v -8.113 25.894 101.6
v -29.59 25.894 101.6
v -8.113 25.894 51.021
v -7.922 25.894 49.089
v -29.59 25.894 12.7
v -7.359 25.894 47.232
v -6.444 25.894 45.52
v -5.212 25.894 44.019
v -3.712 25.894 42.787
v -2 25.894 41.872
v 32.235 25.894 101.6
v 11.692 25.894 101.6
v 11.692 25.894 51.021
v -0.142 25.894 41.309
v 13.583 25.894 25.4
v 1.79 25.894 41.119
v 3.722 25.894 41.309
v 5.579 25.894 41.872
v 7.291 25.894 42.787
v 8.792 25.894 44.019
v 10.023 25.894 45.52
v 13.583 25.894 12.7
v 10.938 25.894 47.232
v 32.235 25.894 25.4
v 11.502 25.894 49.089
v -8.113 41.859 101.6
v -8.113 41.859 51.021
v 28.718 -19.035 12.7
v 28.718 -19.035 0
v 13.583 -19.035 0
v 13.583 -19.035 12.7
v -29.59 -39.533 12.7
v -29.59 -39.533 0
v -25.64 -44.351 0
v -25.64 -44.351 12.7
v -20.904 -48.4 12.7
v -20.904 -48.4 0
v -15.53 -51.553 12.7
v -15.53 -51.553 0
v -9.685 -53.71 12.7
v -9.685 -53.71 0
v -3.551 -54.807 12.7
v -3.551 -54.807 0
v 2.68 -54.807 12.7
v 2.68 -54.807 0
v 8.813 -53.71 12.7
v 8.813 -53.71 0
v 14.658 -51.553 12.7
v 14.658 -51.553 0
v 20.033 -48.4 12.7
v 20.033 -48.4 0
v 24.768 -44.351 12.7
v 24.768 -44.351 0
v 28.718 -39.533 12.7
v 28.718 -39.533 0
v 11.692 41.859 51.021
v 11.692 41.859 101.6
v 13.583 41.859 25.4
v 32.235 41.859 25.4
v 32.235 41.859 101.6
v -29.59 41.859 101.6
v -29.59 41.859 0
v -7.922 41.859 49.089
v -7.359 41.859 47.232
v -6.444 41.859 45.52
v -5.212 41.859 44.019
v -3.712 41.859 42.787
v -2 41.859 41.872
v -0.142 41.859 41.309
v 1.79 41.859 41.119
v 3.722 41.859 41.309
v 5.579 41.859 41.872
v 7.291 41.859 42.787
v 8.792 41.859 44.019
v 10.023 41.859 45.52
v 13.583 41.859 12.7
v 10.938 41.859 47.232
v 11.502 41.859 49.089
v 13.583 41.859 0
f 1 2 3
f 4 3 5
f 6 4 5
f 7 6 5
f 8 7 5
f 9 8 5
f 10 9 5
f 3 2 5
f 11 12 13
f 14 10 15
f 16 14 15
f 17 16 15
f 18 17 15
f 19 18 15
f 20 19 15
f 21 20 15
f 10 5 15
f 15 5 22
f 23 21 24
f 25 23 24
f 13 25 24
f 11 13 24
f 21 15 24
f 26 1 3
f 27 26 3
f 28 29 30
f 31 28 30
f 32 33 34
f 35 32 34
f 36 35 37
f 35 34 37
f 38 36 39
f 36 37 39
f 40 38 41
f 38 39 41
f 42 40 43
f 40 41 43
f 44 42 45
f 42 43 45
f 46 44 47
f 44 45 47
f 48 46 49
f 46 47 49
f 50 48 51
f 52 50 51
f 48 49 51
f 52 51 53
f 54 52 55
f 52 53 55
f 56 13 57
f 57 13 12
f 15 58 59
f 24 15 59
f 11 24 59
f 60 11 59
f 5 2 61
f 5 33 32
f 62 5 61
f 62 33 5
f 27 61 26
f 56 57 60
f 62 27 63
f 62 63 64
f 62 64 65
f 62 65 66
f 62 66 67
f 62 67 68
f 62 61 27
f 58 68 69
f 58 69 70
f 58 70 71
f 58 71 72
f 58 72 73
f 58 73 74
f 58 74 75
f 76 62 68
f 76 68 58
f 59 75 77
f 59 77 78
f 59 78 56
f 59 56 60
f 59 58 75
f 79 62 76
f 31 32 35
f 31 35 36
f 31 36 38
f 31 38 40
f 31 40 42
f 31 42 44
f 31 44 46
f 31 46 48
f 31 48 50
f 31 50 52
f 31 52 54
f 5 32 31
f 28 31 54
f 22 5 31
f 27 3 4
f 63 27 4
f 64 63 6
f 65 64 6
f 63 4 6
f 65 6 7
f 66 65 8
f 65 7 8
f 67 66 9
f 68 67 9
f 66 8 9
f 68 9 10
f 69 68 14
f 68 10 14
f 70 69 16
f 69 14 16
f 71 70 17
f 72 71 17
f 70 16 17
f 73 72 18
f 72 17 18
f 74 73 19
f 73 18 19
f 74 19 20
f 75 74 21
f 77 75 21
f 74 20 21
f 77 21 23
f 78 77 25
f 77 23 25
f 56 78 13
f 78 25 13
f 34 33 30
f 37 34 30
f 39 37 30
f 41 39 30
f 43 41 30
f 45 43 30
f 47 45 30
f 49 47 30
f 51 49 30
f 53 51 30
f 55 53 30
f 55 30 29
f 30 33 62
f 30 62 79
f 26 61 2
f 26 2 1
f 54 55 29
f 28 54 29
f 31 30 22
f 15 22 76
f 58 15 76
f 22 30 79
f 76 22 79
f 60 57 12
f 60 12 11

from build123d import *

# Parameters (mm, degrees)
F1_DEPTH = 12.7
F2_W     = 43.1732637808
F2_H     = 15.9647427499
F3_DEPTH = 12.7
F4_W     = 61.8251115084
F4_H     = 15.9647427499
F5_DEPTH = 76.2
F7_DEPTH = 25.4


with BuildPart() as f1:
    # F0 (on Top) → F1 (new body)
    with BuildSketch(Plane.XY):
        with BuildLine():
            Line((13.5834803805, 41.8586246669), (-29.5897834003, 41.8586246669))
            Line((-29.5897834003, 41.8586246669), (-29.5897834003, -19.0352704376))
            Line((-29.5897834003, -19.0352704376), (-29.5897834003, -39.5325236022))
            ThreePointArc((-29.5897834003, -39.5325236022), (-0.4357211292, -54.9443437525), (28.7183411419, -39.5325236022))
            Line((28.7183411419, -39.5325236022), (28.7183411419, -19.0352704376))
            Line((28.7183411419, -19.0352704376), (13.5834803805, -19.0352704376))
            Line((13.5834803805, -19.0352704376), (13.5834803805, 41.8586246669))
        make_face()
    extrude(amount=F1_DEPTH)

    # F2 (on face) → F3 (join)
    with BuildSketch(Plane.XY.offset(12.7)):
        with Locations((-8.0031515099, 33.876253292)):
            Rectangle(F2_W, F2_H)
    extrude(amount=F3_DEPTH)

    # F4 (on face) → F5 (join)
    with BuildSketch(Plane.XY.offset(25.4)):
        with Locations((1.3227723539, 33.876253292)):
            Rectangle(F4_W, F4_H)
    extrude(amount=F5_DEPTH)

    # F6 (on face) → F7 (cut)
    with BuildSketch(Plane.XZ.offset(-25.893881917)):
        with BuildLine():
            Line((11.6920806468, 101.6), (-8.112533018, 101.6))
            Line((-8.112533018, 101.6), (-8.112533018, 51.0209538043))
            ThreePointArc((-8.112533018, 51.0209538043), (1.7897738144, 41.1186469719), (11.6920806468, 51.0209538043))
            Line((11.6920806468, 51.0209538043), (11.6920806468, 101.6))
        make_face()
    extrude(amount=-F7_DEPTH, mode=Mode.SUBTRACT)


solid = f1.part
